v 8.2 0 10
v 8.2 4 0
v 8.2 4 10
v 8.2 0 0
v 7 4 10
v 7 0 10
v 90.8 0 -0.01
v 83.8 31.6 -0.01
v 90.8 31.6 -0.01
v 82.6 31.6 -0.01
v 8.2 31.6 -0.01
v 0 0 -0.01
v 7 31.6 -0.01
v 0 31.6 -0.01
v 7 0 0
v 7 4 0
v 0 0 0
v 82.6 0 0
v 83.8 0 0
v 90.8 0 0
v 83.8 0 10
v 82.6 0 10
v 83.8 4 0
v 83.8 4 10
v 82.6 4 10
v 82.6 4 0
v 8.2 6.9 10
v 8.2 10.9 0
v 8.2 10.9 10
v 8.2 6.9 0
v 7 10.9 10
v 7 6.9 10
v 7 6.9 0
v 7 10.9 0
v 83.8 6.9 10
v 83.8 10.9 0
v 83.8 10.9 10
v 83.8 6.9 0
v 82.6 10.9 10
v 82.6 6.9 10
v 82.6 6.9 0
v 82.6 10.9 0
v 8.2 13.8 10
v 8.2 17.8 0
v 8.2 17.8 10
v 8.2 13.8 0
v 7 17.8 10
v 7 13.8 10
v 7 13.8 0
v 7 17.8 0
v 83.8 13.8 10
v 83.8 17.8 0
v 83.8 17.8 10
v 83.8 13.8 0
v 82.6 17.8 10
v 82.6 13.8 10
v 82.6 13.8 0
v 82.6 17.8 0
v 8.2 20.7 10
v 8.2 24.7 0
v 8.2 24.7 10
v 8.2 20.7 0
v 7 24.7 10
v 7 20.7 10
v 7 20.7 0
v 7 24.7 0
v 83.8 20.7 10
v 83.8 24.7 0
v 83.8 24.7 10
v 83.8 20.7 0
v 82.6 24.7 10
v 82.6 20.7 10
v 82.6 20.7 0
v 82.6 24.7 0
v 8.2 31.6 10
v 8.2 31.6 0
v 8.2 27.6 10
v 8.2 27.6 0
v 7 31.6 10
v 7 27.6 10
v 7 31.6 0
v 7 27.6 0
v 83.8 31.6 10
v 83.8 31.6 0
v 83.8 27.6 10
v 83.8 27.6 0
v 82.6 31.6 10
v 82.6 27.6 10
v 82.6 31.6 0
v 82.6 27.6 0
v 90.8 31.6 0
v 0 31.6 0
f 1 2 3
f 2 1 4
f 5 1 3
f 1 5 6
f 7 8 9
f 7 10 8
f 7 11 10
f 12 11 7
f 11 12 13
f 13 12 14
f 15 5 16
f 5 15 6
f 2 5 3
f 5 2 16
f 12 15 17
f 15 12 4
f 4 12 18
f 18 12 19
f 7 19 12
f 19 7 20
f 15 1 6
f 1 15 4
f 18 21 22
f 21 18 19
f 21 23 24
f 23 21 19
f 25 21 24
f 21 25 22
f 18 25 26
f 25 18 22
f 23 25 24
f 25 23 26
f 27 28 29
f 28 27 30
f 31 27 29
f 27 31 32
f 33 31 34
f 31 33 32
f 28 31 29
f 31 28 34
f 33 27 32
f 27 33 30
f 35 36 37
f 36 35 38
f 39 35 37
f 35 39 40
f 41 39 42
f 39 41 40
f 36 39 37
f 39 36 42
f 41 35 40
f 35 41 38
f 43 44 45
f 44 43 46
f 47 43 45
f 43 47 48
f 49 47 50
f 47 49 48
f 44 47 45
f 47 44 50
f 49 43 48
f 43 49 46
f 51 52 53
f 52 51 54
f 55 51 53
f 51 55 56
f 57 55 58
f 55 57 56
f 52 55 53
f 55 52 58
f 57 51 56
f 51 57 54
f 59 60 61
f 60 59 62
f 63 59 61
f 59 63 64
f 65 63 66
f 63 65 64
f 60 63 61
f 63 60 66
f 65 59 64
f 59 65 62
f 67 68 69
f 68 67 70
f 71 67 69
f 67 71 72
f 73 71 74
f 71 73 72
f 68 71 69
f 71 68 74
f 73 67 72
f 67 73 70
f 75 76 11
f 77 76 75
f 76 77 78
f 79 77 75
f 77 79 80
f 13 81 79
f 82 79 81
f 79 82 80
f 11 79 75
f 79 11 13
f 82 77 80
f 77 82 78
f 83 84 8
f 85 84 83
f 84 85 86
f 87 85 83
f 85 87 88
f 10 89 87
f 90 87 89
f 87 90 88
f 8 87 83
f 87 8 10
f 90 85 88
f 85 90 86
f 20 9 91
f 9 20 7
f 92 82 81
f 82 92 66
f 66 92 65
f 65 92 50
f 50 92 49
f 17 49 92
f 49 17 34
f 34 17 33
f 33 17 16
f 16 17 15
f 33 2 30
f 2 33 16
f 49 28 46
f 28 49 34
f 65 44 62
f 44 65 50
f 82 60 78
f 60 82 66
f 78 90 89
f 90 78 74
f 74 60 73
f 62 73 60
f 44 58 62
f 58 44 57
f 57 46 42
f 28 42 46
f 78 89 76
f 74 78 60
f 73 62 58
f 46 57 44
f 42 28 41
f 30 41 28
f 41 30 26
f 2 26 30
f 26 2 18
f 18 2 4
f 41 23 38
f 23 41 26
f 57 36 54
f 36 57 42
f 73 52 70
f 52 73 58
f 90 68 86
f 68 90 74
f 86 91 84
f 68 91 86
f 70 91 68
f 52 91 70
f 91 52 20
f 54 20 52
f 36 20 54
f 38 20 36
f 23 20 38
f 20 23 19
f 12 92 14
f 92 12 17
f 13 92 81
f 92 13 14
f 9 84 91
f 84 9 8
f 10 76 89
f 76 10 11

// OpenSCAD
// file: ../Base/Boxes.scad
// Fischertechnik Box Foundation
// Pre-designed Boxes

use <Constants.scad>

include <PlacementOptions.scad>

box190Width = 190;
box190Depth = 130;
box130Width = 130;
box130Depth = 95;
boxUsageHeight = 33.9;
boxWallThickness = 2.4;
boxBaseThickness = 1.0;

// getBoxWallThickness()
// Gets the wall thickness of a Fischertechnik Box

function getBoxWallThickness() = boxWallThickness;

// Gets the usable height of a fischertechnik box
function getBoxUsageHeight() = boxUsageHeight;

// Gets the thickness of the Fischertechnik box base.
function getBoxBaseThickness() = boxBaseThickness;

// Gets the usable inner space of a Box 190 as an x/y-list
function getBox190Space() = [
    box190Width - 2*getBoxWallThickness(), 
    box190Depth - 2*getBoxWallThickness() ];

// Imports the Fischertechnik empty box 130x190 mm and places it at position 0,0
// 190x130 are the outer sizes, the inner space is slightly smaller. Use getBox190Space() to get the inner sizes.
// This module needs the STL file "Fischertechnik Box 130x190.stl" in the library path.
// The box is positioned that the usable inner space is at the 0,0,0 position. The

module Box190() {
    translate([-getBoxWallThickness(),-getBoxWallThickness(),-getBoxBaseThickness()])
        import("Fischertechnik Box 130x190.stl", convexity=3);
}

// Gets the usable inner space of a Box 130 as an x/y-list
function getBox130Space() = [
    box130Width - 2*getBoxWallThickness(), 
    box130Depth - 2*getBoxWallThickness() ];

// Imports the Fischertechnik empty box 95x130 mm and places it at position 0,0
// 190x130 are the outer sizes, the inner space is slightly smaller. Use getBox190Space() to get the inner sizes.
// This module needs the STL file "Fischertechnik Box 95x130.stl" in the library path.
// The box is positioned that the usable inner space is at the 0,0,0 position. The

module Box130() {
    translate([-getBoxWallThickness(),-getBoxWallThickness(),-getBoxBaseThickness()])
        import("Fischertechnik Box 95x130.stl", convexity=3);
}

// Creates a web at the specified box walls
// corner 0 = LowerLeft, 1 = UpperLeft, 2 = UpperRight, 3 = LowerRight
// side 0 = LeftOfCorner, 1 = RightOfCorner
// distance = Distance in mm from the corner
// box = inner width and depth of the box (default: Box 190)
// webWidth = length of the web (default is 3 mms)
// webThickness = thickness of the web (default is 1 mm)

module BoxWeb(corner, side, distance, box=getBox190Space(), webWidth=3, webThickness=1.0) {
    sink = getBoxWallThickness()/2;

    width = (corner % 2 == 0) ? 
            (side == LeftOfCorner ? webWidth : webThickness) :
            (side == LeftOfCorner ? webThickness : webWidth);

    depth = (corner % 2 == 0) ? 
            (side == RightOfCorner ? webWidth : webThickness) :
            (side == RightOfCorner ? webThickness : webWidth);
    
    xDiff = corner == LowerLeft ? 
                (side == LeftOfCorner ? -sink : distance) :
            (corner == UpperLeft ?                
                (side == LeftOfCorner ? distance : -sink) :
            (corner == UpperRight ?
                (side == LeftOfCorner ? box.x-webWidth+sink : box.x-distance-webThickness) :
                (side == LeftOfCorner ? box.x-distance-webThickness: box.x-webWidth+sink)));

    yDiff = corner == LowerLeft ? 
                (side == RightOfCorner ? -sink : distance) :
            (corner == UpperLeft ?
                (side == RightOfCorner ? box.y-distance : box.y-webWidth+sink) :
            (corner == UpperRight ?
                (side == RightOfCorner ? box.y-webWidth+sink : box.y-distance) :
                (side == RightOfCorner ? distance : -sink)));
    
    translate([xDiff, yDiff, -getExcess()])
        cube([width, depth, boxUsageHeight + 2*getExcess()]);
}
// file: ../Base/Rotation.scad
// Fischertechnik Box Foundation
// Geometry Helpers Rotation

include <PlacementOptions.scad>

// getRotatedSpace(space, rotation=NoRotation)
// Rotates the space dependent on the specified rotation

function getRotatedSpace(space, rotation=NoRotation) = [
    (rotation == Rotate90 || rotation == Rotate270) ? space.y : space.x,
    (rotation == Rotate90 || rotation == Rotate270) ? space.x : space.y
];

// Rotates the given space around the fixed left lower corner
// space = the space the children needs as width/depth list [width,depth]
// rotation = 0 Rotate0 degrees, 1 Rotate90 degrees, 2 Rotate180 degrees, 3 Rotate270 degrees (equivalent to -90)

module RotateFix(space, rotation=Rotate0) {
    dy = (rotation == Rotate0 || rotation == Rotate270) ? 0 :
        (rotation == Rotate90) ? space.x :
        space.y;
    dx = (rotation < Rotate180) ? 0 :
        (rotation == Rotate180) ? space.x :
        space.y;
    
    translate([dx, dy, 0])
        rotate([0, 0, rotations[rotation]])
            children();
}
// file: ../Base/Alignment.scad
// Fischertechnik Box Foundation
// Geometry Helpers Alignment

include <PlacementOptions.scad>

// getAlignedX(elementWidth, spaceWidth, align=AlignRight, offset=0)
// Gets the aligned X offset of an element with the given
// width in the given space.
// elementWidth = The width of the element to positon
// spaceWidth = The space where the element should be aligned
// align = 0 AlignLeft, 1 AlignCenter, 2 AlignRight
// offset = an optional offset from the aligned position. When
// aligned left or centered, then positive values are in X direction.
// When aligned right then positive values are in negative X direction.

function getAlignedX(elementWidth, spaceWidth, align=AlignRight, offset=0) =
    (align == AlignLeft) ?
        offset :
        ((align == AlignCenter) ?
        (spaceWidth - elementWidth)/2 + offset :
        spaceWidth - offset - elementWidth);

// getAlignedY(elementDepth, spaceDepth, align=AlignTop, offset=0)
// Gets the aligned Y offset of an element with the given
// depth in the given space.
// elementDepth = The depth of the element to positon
// spaceDepth = The space where the element should be aligned
// align = 0 AlignBottom, 1 AlignCenter, 2 AlignTop
// offset = an optional offset from the aligned position. When
// aligned bottom or centered, then positive values are in Y direction.
// When aligned top then positive values are in negative Y direction.

function getAlignedY(elementDepth, spaceDepth, align=AlignTop, offset=0) =
    (align == AlignBottom) ?
        offset :
        ((align == AlignCenter) ?
        (spaceDepth - elementDepth)/2 + offset :
        spaceDepth - offset - elementDepth);
// file: ../Base/PlacementOptions.scad
// Fischertechnik Box Foundation
// Placement Options

// Alignment
NoAlign = 0;
AlignLeft = 1;
AlignBottom = 2;
AlignCenter = 3;
AlignRight = 4;
AlignTop = 5;

// Element rotation degree steps
rotations = [0, -90, -180, -270];

// Rotation
NoRotation = 0;
Rotate0 = 0;
Rotate90 = 1;
Rotate180 = 2;
Rotate270 = 3;

// Docking (seen from above)
NoDock = -1;
DockLeft = 0;
DockTop = 1;
DockRight = 2;
DockCorner = 2;
DockBottom = 3;

// Web corners
LowerLeft = 0;
UpperLeft = 1;
UpperRight = 2;
LowerRight = 3;

// Web position relative to corner
LeftOfCorner = 0;
RightOfCorner = 1;
// file: ../Base/Placement.scad
// Fischertechnik Box Foundation
// Geometry Helpers Placement

use <Constants.scad>
use <Alignment.scad>
use <Rotation.scad>
use <Boxes.scad>

include <PlacementOptions.scad>

// Place(x=0, y=0, elementSpace=[0,0], alignX=AlignLeft, alignY=AlignBottom, rotation=Rotate0, boxSpace=getBox190Space())
// Places the child at the specified position
// y = Y-Position. This is a relative position when an X aligment is specified.
// x = X-Position. This is a relative position when an Y aligment is specified.
// elementSpace = space of the element to be placed [x,y]
// alignX = -1=NoAlign, 0 AlignLeft, 1 AlignCenter, 3 AlignRight (elementSpace and boxSpace required!)
// alignY = -1=NoAlign, 2 AlignBottom, 1 AlignCenter, 4 AlignTop (elementSpace and boxSpace required!)
// rotation = 0 Rotate0 0 degrees, 1 Rotate90 90 degrees, 
// 2 Rotate180 180 degrees, 3 Rotate270 270 degrees (equivalent to -90)
// boxSpace = Inner space of the box where the placement occurs [x,y] - default is Box 190x130 inner space

module Place(x=0, y=0, elementSpace=[0,0], 
  alignX=AlignLeft, alignY=AlignBottom, 
  rotation=NoRotation, boxSpace=getBox190Space()) {

    module Position(x, y, space, rotation=Rotate0) {
        translate([x, y, 0])
            RotateFix(space, rotation)
                children(0);
    }

    space = getRotatedSpace(elementSpace, rotation);
    alignedX = getAlignedX(space.x, boxSpace.x, alignX, x);
    alignedY = getAlignedY(space.y, boxSpace.y, alignY, y);
    Position(alignedX, alignedY, elementSpace, rotation)
        children(0);
}

// Center(space=getBox130Space(), elementSpace=[0,0])
// space = Space where the children is centered. For cylinder use centered=true and no elementSpace.
// elementSpace = space of the element to be centered [x,y]

module Center(space=getBox190Space(), elementSpace=[0,0]) {
    translate([(space.x - elementSpace.x) / 2, (space.y - elementSpace.y) / 2])
        children(0);
}

// CenterHorizontal(width=0, y=0, offset=0, space=getBox130Space())
// space = Space where the children is centered. For cylinder use centered=true and no elementSpace.
// elementSpace = space of the element to be centered [x,y]

module CenterHorizontal(width=0, y=0, offset=0, space=getBox190Space()) {
    translate([(space.x - width) / 2 + offset, y])
        children(0);
}

// CenterVertical(depth=0, x=0, offset=0, space=getBox130Space())
// space = Space where the children is centered. For cylinder use centered=true and no elementSpace.
// elementSpace = space of the element to be centered [x,y]

module CenterVerticalal(depth=0, x=0, offset=0, space=getBox190Space()) {
    translate([x, (space.y - depth) / 2 + offset])
        children(0);
}
// file: ../Base/Constants.scad
// Fischertechnik Box Foundation
// Constants

// Constant values necessary for multiple elements

// Base constants
dividerThickness = 1.2;
excess = 0.01;
fragments = 90;
tolerance = 0.8;

// Gets the thickness of a divider 
function getDividerThickness() = dividerThickness;

// Gets the excess that is used to merge walls into each other
function getExcess() = excess;

// Gets amount of fragments of a cylinder
function getFragments() = fragments;

// Gets the inner tolerance of a frame to each side
function getTolerance() = tolerance;


// Fischertechnik specific constants
axisDiameter = 4;
axisBottomDiameter = axisDiameter + 1;
standardEdgeDistance = 2.5;
standardWebDistance = 11.5;
standardCornerLength = 15;
tubeWallFactor = 1.6;

// Gets axis diameter
function getAxisDiameter() = axisDiameter;

// Gets axis bottom diameter for thicker part at the bottom
function getAxisBottomDiameter() = axisBottomDiameter;

// gets the standard distance to the wall of the box for dockable frames with webs
function getStandardEdgeDistance() = standardEdgeDistance;

// gets the standard distance of each web to the corner of the dockable frame
function getStandardWebDistance() = standardWebDistance;

// gets the standard length of the corner walls of a dockable frame
function getStandardCornerLength() = standardCornerLength;

// gets the wall thickness of a tube.
function getTubeWallThickness() = tubeWallFactor * getDividerThickness();
// main file
// Fischertechnik Box Library
// Holder for Building Plate 90x30
// 38251

use <../ModelBase/Complex.scad>

width = 90;

// getHolderBuildingPlateSpace90x30(count = 1)
// Gets the width (.x) and depth (.y) space the holder needs.

function getHolderBuildingPlate90x30Space(count = 1) = getHolderBuildingPlateSpace(width, count);

// HolderBuildingPlate90x30(count=1, dock=false)
// Holder for building plates 90x30
// count = Count of building plates (default 1)
// dock = true if the holders are docked to the box wall (default false) 

module HolderBuildingPlate90x30(count = 1, dock = false) {
    HolderBuildingPlate(width, count, firstGapHigher = dock);
}

// Test
color("lightgray")
HolderBuildingPlate90x30(4);
